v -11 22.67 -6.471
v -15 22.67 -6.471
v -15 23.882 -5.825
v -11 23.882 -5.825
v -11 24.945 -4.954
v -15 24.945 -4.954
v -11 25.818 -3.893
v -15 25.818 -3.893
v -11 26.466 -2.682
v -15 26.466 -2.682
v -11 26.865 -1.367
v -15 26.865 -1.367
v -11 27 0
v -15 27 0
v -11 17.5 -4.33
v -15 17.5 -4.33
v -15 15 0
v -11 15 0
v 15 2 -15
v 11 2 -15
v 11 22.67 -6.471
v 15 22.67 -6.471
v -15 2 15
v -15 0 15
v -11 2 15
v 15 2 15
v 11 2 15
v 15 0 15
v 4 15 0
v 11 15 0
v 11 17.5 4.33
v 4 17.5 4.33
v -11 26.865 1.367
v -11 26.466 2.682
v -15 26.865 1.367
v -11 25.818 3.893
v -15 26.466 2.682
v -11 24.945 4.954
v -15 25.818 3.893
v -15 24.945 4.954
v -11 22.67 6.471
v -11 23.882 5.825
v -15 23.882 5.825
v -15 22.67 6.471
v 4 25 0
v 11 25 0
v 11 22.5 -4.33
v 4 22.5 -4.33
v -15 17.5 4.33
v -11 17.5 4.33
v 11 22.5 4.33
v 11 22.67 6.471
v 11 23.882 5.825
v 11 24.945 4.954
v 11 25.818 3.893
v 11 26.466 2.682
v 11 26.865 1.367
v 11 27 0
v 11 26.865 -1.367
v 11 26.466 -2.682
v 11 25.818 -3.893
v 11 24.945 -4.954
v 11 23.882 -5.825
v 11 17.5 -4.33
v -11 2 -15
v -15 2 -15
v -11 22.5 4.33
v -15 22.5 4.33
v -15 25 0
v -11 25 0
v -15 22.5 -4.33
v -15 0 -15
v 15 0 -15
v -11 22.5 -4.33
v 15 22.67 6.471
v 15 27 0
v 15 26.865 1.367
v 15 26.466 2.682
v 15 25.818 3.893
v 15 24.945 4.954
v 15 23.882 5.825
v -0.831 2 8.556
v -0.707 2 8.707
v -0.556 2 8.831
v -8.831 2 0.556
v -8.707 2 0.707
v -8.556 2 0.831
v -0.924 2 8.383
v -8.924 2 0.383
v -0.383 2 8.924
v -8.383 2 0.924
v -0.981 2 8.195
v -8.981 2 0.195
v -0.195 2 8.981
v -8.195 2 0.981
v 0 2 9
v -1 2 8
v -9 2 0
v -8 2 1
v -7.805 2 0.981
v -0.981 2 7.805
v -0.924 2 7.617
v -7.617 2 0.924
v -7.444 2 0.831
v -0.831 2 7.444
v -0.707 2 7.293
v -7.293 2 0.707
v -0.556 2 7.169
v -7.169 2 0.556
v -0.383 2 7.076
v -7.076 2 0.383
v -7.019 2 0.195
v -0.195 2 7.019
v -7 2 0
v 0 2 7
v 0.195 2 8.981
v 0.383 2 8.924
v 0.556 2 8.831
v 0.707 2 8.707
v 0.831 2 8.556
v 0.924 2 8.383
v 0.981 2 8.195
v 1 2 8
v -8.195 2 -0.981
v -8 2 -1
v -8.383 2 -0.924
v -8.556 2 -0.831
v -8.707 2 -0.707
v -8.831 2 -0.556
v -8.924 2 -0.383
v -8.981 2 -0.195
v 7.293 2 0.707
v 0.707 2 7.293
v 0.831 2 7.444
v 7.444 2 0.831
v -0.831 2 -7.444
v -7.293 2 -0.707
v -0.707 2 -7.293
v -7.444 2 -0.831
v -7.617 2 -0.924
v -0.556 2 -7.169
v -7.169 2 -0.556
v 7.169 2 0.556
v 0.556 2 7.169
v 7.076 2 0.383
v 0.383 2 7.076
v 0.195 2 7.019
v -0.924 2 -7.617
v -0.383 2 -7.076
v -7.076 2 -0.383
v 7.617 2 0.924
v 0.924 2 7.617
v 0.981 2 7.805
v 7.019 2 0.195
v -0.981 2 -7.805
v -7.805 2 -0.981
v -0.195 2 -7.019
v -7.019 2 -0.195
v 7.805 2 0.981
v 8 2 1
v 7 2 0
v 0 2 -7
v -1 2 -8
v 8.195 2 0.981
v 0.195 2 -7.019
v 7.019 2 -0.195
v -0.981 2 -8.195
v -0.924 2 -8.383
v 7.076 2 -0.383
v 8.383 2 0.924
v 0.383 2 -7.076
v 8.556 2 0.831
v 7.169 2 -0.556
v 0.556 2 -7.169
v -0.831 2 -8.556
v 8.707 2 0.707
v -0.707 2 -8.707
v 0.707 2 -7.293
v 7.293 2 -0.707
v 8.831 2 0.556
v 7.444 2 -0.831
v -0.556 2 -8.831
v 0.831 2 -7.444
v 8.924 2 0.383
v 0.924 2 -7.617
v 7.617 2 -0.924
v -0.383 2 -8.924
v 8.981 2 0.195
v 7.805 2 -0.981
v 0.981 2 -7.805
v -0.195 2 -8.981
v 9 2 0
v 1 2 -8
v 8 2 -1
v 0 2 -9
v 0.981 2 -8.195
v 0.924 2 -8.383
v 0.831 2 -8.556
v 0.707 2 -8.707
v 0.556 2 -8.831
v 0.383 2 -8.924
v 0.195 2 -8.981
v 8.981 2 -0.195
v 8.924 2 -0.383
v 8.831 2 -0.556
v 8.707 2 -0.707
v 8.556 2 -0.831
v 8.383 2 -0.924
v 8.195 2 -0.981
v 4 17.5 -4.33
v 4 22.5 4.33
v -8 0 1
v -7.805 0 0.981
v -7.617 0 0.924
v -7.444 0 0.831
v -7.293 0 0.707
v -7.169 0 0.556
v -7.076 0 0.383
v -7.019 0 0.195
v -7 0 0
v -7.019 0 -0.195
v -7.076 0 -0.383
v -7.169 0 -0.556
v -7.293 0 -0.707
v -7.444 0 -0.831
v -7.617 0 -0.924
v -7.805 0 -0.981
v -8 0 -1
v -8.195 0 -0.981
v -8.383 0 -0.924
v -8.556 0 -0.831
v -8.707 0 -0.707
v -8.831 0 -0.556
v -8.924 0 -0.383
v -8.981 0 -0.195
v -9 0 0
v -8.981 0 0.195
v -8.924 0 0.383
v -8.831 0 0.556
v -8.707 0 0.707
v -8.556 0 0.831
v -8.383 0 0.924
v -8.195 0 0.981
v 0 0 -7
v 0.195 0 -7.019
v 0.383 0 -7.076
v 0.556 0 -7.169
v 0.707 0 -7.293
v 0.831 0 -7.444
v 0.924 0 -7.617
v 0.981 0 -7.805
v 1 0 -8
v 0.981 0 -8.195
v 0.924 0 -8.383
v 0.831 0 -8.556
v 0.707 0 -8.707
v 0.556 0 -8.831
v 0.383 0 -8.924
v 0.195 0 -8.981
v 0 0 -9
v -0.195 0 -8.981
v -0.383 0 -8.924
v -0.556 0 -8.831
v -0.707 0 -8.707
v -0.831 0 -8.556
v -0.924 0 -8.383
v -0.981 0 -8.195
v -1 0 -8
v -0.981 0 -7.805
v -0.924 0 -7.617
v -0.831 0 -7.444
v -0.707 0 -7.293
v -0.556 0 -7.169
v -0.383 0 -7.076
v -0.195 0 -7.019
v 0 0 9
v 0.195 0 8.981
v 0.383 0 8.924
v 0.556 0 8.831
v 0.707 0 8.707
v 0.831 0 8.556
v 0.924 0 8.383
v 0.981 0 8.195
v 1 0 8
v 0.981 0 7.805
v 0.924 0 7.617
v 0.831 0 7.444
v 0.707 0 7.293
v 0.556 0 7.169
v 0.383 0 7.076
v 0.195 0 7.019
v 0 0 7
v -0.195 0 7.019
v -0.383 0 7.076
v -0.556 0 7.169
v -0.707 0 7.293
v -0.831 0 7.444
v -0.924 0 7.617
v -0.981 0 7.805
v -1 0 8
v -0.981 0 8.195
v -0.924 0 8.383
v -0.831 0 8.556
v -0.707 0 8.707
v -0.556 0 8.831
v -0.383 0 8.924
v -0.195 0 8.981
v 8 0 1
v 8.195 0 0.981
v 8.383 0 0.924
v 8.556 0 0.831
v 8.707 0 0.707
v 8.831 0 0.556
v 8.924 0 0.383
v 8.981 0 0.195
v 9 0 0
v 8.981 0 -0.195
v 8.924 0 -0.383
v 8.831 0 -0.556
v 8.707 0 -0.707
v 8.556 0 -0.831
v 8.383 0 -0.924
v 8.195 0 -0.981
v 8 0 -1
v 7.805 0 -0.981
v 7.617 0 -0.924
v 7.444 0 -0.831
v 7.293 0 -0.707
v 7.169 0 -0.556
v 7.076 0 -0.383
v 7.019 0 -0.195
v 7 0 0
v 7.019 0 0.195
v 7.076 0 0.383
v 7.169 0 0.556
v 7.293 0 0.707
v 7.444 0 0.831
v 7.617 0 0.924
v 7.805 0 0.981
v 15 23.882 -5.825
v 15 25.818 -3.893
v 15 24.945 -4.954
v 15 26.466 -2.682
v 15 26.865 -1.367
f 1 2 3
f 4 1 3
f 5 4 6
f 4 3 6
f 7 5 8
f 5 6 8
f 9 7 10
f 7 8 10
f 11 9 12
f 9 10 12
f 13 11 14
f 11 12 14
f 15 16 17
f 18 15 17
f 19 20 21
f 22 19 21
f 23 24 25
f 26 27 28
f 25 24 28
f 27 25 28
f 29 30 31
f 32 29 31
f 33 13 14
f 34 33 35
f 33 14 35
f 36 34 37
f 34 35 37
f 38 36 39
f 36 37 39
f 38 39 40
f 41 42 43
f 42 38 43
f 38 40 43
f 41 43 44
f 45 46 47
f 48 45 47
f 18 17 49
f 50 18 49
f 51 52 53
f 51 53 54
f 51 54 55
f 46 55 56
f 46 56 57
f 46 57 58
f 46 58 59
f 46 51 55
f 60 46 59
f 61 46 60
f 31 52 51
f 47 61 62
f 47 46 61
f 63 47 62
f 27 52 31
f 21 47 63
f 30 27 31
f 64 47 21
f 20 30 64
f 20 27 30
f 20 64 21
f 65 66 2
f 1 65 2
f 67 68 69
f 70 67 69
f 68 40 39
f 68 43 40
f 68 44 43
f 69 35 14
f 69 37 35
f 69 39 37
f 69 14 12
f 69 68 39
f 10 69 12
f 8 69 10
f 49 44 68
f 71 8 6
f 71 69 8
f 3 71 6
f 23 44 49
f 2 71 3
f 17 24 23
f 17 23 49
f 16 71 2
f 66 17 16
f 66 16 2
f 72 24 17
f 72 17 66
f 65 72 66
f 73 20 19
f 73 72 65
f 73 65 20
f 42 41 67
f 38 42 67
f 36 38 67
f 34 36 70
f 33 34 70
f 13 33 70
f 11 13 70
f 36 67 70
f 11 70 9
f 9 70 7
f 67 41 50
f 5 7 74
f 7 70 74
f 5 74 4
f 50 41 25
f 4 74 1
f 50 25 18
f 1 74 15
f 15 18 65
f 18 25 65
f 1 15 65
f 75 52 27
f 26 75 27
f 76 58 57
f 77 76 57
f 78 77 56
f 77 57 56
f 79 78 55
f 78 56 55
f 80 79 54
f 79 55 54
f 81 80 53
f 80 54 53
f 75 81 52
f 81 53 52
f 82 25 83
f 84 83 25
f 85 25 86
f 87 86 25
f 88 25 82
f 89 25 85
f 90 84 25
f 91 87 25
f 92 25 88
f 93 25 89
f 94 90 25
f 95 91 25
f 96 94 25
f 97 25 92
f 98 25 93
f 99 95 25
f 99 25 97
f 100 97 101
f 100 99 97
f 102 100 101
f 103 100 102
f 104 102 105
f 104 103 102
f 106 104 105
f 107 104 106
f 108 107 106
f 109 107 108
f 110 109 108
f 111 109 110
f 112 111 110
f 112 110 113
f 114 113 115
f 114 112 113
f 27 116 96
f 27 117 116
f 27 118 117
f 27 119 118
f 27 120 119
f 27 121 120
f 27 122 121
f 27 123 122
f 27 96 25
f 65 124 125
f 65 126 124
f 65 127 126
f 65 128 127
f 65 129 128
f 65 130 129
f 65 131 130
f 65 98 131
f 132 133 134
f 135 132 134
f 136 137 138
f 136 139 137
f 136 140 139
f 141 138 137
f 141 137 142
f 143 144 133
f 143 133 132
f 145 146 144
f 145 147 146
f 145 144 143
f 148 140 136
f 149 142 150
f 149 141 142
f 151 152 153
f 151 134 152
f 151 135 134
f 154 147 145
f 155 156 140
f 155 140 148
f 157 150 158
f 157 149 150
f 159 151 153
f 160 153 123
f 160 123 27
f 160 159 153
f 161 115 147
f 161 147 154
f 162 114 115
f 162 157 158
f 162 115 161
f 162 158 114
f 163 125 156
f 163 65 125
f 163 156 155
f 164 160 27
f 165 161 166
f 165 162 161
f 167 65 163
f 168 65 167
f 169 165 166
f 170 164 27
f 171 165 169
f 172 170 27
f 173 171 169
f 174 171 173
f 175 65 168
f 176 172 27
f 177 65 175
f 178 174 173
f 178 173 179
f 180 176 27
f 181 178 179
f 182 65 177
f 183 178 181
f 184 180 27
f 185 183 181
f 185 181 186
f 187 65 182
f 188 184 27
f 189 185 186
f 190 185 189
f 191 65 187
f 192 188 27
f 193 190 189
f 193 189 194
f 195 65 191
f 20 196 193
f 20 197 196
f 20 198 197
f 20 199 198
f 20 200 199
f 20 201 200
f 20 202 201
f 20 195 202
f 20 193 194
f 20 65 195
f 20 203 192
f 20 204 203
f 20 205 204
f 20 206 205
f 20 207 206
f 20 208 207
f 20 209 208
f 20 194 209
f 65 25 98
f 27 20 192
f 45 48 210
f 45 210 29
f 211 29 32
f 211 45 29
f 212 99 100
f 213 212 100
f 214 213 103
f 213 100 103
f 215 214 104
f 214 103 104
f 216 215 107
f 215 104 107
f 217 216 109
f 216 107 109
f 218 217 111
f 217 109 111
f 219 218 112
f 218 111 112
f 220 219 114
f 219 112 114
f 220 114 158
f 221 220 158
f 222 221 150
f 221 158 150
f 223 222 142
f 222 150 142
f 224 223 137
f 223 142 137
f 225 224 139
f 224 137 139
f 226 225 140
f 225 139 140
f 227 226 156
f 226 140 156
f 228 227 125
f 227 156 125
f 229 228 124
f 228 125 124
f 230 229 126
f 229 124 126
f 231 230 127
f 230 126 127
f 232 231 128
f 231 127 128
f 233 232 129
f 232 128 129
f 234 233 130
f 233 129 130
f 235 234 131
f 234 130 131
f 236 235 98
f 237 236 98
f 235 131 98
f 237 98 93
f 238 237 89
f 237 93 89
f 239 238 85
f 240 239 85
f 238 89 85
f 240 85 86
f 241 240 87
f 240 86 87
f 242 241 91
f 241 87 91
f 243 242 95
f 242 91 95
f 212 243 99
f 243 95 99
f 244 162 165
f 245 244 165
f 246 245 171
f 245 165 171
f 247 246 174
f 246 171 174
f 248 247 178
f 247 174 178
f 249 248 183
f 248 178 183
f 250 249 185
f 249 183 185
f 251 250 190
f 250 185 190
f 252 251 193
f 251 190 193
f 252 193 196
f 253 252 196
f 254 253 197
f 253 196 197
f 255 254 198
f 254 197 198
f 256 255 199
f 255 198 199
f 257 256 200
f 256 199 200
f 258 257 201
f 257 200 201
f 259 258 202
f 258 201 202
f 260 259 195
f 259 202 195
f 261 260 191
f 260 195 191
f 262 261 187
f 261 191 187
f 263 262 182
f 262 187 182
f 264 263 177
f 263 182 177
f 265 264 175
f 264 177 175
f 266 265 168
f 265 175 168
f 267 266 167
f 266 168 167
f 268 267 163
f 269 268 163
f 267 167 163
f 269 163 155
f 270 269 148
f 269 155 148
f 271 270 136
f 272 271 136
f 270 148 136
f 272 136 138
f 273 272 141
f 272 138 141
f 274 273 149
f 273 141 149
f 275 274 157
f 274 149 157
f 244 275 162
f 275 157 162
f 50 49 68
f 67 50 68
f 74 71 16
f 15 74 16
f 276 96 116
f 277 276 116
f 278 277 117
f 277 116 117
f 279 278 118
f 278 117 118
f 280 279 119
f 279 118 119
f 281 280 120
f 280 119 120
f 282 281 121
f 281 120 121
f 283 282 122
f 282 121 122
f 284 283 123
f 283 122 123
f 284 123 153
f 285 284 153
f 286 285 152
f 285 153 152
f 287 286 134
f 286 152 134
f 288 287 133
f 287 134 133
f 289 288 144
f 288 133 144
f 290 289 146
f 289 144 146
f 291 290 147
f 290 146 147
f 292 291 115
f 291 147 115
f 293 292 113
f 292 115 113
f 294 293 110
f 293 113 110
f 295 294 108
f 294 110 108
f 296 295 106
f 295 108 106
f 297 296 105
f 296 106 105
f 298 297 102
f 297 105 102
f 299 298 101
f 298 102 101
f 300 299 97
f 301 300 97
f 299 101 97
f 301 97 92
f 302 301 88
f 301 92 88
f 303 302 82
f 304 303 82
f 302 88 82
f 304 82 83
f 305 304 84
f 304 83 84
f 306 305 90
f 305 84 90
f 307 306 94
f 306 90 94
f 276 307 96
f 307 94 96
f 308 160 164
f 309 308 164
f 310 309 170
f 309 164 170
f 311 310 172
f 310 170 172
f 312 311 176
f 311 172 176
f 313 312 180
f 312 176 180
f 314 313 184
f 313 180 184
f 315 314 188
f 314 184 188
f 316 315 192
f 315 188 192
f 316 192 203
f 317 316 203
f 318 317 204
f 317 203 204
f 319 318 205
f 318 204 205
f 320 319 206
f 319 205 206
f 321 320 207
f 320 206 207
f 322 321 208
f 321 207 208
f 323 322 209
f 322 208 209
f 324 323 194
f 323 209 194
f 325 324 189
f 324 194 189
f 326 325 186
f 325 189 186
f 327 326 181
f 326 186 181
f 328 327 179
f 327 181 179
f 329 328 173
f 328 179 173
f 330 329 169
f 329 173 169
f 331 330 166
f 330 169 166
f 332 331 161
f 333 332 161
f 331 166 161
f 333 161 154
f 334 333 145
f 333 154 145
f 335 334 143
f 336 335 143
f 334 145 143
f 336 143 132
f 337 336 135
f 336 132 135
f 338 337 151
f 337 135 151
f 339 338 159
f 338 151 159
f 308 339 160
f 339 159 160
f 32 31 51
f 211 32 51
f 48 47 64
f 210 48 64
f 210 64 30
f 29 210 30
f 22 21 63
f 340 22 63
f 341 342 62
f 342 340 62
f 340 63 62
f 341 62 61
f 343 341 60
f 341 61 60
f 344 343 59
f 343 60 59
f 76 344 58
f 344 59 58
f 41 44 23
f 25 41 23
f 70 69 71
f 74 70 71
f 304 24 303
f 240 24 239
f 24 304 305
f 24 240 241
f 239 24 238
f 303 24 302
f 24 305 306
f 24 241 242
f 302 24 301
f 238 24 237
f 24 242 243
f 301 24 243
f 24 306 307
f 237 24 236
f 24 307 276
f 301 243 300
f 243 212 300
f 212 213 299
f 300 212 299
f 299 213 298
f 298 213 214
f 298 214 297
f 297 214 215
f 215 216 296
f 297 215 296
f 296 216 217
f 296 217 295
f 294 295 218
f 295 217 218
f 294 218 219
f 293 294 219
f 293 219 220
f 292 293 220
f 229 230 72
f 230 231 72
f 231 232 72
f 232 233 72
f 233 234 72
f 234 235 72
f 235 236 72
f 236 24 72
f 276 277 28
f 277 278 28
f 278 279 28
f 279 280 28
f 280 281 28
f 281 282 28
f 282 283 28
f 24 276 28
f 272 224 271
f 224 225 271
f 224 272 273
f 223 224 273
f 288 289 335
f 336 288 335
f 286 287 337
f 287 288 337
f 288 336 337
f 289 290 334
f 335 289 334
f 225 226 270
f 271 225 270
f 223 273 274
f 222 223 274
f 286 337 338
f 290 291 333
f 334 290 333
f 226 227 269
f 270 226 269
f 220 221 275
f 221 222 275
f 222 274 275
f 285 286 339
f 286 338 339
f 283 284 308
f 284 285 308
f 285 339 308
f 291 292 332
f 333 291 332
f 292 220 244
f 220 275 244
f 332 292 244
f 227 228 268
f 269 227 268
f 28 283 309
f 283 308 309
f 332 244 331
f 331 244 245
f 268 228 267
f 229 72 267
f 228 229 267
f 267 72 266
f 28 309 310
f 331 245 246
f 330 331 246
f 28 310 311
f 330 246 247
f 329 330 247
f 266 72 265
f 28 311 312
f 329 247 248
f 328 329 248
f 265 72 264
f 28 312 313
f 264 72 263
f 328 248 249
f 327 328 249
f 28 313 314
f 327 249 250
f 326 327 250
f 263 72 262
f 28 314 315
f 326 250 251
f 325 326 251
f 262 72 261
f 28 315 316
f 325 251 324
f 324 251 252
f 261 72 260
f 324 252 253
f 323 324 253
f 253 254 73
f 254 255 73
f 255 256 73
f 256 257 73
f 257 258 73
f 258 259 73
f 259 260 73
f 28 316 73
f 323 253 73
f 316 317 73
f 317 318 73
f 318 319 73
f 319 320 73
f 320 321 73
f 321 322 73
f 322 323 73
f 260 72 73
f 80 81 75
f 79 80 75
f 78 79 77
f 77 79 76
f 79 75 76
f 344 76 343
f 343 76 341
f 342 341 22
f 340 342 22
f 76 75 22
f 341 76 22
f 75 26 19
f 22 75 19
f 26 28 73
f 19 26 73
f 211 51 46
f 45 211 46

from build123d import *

# Parameters (mm, degrees)
SKETCH1_W           = 30
SKETCH1_H           = 30
BOSS_EXTRUDE1_DEPTH = 2
SKETCH2_R           = 1
CUT_EXTRUDE1_DEPTH  = 2
SKETCH3_W           = 4
SKETCH3_H           = 30
BOSS_EXTRUDE2_DEPTH = 25
CUT_EXTRUDE2_DEPTH  = 38
BOSS_EXTRUDE3_DEPTH = 7
CUT_EXTRUDE3_DEPTH  = 7


with BuildPart() as part:
    # Sketch1 → Boss-Extrude1 (new body)
    with BuildSketch(Plane(origin=(0, 0, 0), x_dir=(1, 0, 0), z_dir=(0, 1, 0))):
        Rectangle(SKETCH1_W, SKETCH1_H)
    extrude(amount=BOSS_EXTRUDE1_DEPTH)

    # Sketch2 → Cut-Extrude1 (cut)
    with BuildSketch(Plane(origin=(0, 2, 0), x_dir=(1, 0, 0), z_dir=(0, 1, 0))):
        with Locations(Location((0, 8, 0), (0, 0, 270))):
            Circle(SKETCH2_R)
        with Locations(Location((8, 0, 0), (0, 0, 270))):
            Circle(SKETCH2_R)
        with Locations(Location((0, -8, 0), (0, 0, 270))):
            Circle(SKETCH2_R)
        with Locations(Location((-8, 0, 0), (0, 0, 270))):
            Circle(SKETCH2_R)
    extrude(amount=-CUT_EXTRUDE1_DEPTH, mode=Mode.SUBTRACT)

    # Sketch3 → Boss-Extrude2 (add)
    with BuildSketch(Plane(origin=(0, 2, 0), x_dir=(1, 0, 0), z_dir=(0, 1, 0))):
        with Locations((-13, 0)):
            Rectangle(SKETCH3_W, SKETCH3_H)
        with Locations((13, 0)):
            Rectangle(SKETCH3_W, SKETCH3_H)
    extrude(amount=BOSS_EXTRUDE2_DEPTH)

    # Sketch5 → Cut-Extrude2 (cut)
    with BuildSketch(Plane.ZY.offset(15)):
        with BuildLine():
            Line((15, 27), (0, 27))
            ThreePointArc((0, 27), (3.892908452, 25.817668243), (6.470757107, 22.670075367))
            Line((6.470757107, 22.670075367), (15, 2))
            Line((15, 2), (15, 27))
        make_face()
        with BuildLine():
            ThreePointArc((-6.470757107, 22.670075367), (-3.892908452, 25.817668243), (0, 27))
            Line((0, 27), (-15, 27))
            Line((-15, 27), (-15, 2))
            Line((-15, 2), (-6.470757107, 22.670075367))
        make_face()
    extrude(amount=-CUT_EXTRUDE2_DEPTH, mode=Mode.SUBTRACT)

    # Sketch6 → Boss-Extrude3 (add)
    with BuildSketch(Plane.ZY.offset(-11)):
        Polygon((0, 25), (-4.330127019, 22.5), (-4.330127019, 17.5), (0, 15), (4.330127019, 17.5), (4.330127019, 22.5), align=None)
    extrude(amount=BOSS_EXTRUDE3_DEPTH)

    # Sketch7 → Cut-Extrude3 (cut)
    with BuildSketch(Plane.ZY.offset(15)):
        Polygon((0, 25), (-4.330127019, 22.5), (-4.330127019, 17.5), (0, 15), (4.330127019, 17.5), (4.330127019, 22.5), align=None)
    extrude(amount=-CUT_EXTRUDE3_DEPTH, mode=Mode.SUBTRACT)


solid = part.part
